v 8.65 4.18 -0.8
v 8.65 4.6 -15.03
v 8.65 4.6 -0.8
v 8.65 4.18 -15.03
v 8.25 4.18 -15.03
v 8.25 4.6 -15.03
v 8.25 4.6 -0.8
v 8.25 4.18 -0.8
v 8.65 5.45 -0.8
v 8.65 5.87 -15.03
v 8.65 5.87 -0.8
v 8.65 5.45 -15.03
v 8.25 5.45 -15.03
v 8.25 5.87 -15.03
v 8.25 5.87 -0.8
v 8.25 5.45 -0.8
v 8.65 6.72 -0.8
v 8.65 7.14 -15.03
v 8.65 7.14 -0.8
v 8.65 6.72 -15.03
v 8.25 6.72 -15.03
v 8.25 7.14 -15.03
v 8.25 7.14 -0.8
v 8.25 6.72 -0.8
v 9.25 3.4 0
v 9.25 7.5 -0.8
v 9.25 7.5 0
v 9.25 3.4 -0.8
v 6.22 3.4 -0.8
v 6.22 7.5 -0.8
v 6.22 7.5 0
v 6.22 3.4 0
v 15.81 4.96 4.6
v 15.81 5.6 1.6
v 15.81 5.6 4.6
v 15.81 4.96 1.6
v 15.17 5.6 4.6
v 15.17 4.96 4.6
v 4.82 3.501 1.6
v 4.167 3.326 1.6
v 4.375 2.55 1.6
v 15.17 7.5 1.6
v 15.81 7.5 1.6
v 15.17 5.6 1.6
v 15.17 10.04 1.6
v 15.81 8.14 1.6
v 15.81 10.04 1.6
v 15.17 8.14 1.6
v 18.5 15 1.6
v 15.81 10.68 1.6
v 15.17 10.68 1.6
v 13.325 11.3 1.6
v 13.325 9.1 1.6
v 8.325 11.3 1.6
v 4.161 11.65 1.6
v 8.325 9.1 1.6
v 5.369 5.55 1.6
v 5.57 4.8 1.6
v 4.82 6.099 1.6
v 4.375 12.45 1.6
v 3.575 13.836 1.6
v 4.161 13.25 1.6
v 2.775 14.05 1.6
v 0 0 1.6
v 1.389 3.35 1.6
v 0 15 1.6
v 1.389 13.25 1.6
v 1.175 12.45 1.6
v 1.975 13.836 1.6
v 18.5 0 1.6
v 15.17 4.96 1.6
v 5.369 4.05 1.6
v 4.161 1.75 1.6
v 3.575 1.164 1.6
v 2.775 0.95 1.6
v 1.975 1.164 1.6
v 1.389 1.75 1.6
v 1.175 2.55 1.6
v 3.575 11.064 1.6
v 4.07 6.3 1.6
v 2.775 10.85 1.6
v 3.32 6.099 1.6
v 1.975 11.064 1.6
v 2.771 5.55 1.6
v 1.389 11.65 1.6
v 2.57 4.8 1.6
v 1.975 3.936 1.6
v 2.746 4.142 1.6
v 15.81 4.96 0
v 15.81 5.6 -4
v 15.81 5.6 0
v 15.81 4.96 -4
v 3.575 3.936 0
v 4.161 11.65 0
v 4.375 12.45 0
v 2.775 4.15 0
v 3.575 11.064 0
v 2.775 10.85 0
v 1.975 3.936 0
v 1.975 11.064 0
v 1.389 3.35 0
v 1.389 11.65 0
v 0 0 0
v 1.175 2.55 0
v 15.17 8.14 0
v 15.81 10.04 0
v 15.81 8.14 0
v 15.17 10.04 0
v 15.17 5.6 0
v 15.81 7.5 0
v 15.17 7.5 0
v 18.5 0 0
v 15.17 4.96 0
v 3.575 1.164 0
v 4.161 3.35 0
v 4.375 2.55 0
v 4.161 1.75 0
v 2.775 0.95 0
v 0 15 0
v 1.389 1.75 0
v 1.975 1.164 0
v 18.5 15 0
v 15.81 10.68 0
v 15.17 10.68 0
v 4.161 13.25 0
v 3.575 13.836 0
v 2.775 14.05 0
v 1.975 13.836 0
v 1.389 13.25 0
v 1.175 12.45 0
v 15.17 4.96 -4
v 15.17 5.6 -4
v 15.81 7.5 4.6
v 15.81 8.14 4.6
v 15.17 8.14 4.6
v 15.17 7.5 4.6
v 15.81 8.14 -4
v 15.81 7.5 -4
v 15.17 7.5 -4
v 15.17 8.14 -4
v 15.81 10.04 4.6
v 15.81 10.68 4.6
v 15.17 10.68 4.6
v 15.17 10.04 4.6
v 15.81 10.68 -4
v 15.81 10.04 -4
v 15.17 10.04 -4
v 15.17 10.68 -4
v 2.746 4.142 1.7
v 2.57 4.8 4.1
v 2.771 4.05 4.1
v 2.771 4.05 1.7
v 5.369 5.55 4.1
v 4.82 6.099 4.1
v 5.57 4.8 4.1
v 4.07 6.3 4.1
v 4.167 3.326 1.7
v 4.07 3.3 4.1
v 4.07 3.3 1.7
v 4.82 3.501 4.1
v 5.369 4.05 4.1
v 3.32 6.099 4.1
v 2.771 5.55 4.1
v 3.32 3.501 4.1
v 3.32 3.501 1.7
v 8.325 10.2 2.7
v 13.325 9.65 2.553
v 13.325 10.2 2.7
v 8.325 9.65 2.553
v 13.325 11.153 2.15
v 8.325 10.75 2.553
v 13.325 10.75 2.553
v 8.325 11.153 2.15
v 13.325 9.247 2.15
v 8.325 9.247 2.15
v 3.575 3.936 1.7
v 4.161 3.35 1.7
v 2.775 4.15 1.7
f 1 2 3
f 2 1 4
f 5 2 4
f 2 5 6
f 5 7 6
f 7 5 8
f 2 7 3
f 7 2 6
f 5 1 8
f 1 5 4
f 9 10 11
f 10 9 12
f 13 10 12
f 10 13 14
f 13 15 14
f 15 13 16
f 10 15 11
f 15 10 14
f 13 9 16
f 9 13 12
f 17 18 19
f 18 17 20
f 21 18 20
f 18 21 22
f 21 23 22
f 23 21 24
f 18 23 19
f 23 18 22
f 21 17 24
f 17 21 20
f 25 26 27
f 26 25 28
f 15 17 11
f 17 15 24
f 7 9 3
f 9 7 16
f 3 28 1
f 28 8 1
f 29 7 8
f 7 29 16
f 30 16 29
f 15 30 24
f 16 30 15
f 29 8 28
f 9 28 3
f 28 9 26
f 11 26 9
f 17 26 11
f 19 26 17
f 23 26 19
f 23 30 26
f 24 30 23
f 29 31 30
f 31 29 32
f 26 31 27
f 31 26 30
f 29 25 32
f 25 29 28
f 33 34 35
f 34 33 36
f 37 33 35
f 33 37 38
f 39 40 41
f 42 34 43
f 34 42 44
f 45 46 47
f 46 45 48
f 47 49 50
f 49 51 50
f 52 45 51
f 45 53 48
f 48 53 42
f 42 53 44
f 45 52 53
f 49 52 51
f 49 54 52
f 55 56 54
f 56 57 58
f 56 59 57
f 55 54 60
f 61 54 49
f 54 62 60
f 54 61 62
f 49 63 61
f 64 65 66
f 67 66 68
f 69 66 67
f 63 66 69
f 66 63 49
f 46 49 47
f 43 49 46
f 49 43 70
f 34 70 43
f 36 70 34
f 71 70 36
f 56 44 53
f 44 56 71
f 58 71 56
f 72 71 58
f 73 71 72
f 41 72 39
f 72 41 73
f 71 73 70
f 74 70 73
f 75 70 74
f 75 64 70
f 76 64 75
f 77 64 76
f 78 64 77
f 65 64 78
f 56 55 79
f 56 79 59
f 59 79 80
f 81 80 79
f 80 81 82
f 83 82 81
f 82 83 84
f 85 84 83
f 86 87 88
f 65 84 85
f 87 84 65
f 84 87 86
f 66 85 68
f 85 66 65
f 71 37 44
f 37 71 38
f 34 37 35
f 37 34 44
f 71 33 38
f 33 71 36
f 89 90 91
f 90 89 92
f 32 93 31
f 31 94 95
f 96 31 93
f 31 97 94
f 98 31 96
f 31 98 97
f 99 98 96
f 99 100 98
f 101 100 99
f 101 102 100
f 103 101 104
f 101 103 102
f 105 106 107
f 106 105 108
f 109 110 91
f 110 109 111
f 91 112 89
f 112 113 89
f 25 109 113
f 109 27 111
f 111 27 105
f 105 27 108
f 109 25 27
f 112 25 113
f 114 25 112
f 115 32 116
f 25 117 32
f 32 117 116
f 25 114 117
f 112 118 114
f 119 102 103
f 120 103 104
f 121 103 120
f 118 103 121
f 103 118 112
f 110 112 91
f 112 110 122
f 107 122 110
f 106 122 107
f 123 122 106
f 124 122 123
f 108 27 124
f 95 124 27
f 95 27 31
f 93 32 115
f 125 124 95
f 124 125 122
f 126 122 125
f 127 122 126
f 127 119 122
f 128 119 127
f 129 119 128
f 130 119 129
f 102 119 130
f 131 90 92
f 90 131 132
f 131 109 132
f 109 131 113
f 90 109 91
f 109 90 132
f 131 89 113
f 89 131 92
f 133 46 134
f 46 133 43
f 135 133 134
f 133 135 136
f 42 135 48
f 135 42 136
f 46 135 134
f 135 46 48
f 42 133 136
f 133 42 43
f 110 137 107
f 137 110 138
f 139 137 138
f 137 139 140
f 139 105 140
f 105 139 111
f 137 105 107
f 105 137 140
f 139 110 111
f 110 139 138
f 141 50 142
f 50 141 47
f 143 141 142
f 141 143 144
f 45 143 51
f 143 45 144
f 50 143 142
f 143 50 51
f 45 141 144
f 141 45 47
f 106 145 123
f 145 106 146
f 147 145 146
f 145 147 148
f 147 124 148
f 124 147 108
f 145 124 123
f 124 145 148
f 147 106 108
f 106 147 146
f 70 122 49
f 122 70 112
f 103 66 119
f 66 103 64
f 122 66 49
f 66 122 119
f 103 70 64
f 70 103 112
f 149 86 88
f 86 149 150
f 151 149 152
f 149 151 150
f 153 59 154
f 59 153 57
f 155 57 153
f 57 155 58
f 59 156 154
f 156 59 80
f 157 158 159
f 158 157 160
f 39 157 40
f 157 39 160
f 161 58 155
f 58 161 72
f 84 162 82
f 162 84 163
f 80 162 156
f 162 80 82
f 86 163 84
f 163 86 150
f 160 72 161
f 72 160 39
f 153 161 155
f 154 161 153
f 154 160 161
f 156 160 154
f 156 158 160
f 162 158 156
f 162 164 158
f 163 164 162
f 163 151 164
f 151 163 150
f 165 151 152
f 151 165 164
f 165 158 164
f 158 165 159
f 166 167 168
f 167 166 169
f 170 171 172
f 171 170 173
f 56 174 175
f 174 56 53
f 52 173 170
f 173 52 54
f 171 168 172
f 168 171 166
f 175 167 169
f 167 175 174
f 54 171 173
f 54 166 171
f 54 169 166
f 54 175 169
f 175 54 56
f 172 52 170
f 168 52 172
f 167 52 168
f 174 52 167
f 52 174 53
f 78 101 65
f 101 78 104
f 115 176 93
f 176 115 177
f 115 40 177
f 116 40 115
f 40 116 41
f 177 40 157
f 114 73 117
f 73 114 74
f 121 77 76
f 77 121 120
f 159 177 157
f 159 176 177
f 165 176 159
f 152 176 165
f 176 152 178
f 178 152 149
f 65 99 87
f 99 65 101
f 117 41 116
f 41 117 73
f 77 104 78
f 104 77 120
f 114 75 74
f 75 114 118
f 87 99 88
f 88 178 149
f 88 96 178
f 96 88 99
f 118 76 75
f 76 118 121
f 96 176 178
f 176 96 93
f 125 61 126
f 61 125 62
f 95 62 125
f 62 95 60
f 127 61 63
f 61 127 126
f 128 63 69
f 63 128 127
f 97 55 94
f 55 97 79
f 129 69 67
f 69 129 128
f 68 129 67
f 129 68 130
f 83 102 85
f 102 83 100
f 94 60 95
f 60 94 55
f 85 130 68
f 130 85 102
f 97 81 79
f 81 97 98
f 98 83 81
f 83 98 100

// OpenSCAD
// KY-003 Hall Magnetic Sensor Module — dock water-level / canister-present sensor
// BOM (upstream BOM.md, Dock table): "Water level, canisters present sensors | 4 |
// $0.30 | Hall sensors KY-003, 2x (clean + dirty water) canister present + 2x
// (clean-low, dirty-full) floats"
//
// Function: 3-pin digital Hall-effect switch module (A3144 unipolar switch +
// pull-up resistor + status LED) that outputs ACTIVE-LOW when the SOUTH pole of
// a magnet is presented to the MARKED face of the A3144. In OOMWOO the dock
// mounts four of these to detect magnet-fitted floats (clean-low, dirty-full)
// and magnet-fitted canisters (clean/dirty present). "KY-003" is a generic
// clone-name shared by many vendors (Elegoo/Keyes 37-in-1 kits, JOY-IT, etc.)
// whose PCB outline DIFFERS by vendor — see `variant` below.
//
// Dimension provenance (ALL fetched THIS run, 2026-08-17):
//  * A3144 IC body  — (datasheet: Allegro A3141-2-3-4 Datasheet, Discontinued
//    Product Data Sheet 27621.6B, Dwg. MH-014E, "PACKAGE DESIGNATOR 'UA'":
//    body W 4.04-4.17, L 2.97-3.10, H 1.47-1.57 mm; lead pitch 1.27 BSC; lead
//    width 0.36-0.48; lead thickness 0.35-0.44; overall len w/ formed leads
//    15.24-16.26 mm). "suffix '-UA' is a three-lead ultra-mini-SIP".
//  * JOY-IT variant envelope — (datasheet: JOY-IT SEN-KY003HMS Datasheet
//    2023-08-25: "Dimensions 30 x 15 x 7 mm", chipset A3144, active-low,
//    supply 4.5-24 V).
//  * Generic 37-in-1/enclosure form factor — (secondary: arduinomodules.info
//    KY-003 page, fetched 2026-08-17: "Board dimensions: 18.5 x 15 mm",
//    3x 2.54 mm header pins, pinning "-/VCC/S" w/ S right, middle VCC).
//  * STANDARD-variant PCB thickness 1.6 mm — (estimate) standard FR4; caliper.
//  * All internal component POSITIONS on both variants — (estimate), clones
//    differ; see MEASURE-ME §19. The critical dock facts to re-verify on the
//    physical unit are the PCB envelope + where the A3144 marked face sits.
//
// Licensed CC0 — use freely.

// ===== PARAMETERS =====

// ---- Variant selector: "standard" (AliExpress/37-in-1 generic) or "joyit" ----
variant   = "standard"; // "standard" | "joyit"

// ---- PCB envelope ----
// standard variant (secondary: arduinomodules.info 18.5 x 15; thickness est)
// joyit    variant (datasheet: JOY-IT SEN-KY003HMS "30 x 15 x 7 mm")
pcb_l     = (variant == "joyit") ? 30.0 : 18.5; // mm board LENGTH along pin axis
pcb_w     = (variant == "joyit") ? 15.0 : 15.0; // mm board WIDTH  across pin axis
pcb_t     = (variant == "joyit") ? 1.6  : 1.6;  // mm board thickness (estimate) FR4
// (joyit's 7 mm overall height is BOARD+COMPONENTS; see comp_h below)

// ---- A3144 unipolar Hall-effect switch, package -UA (datasheet: Allegro
// ---- D.S. 27621.6B, Dwg. MH-014E — all from the UA package drawing)
ic_w      =  4.10;  // mm (datasheet: UA body width 4.04-4.17) nominal
ic_l      =  3.03;  // mm (datasheet: UA body length 2.97-3.10) nominal
ic_h      =  1.52;  // mm (datasheet: UA body height 1.47-1.57) nominal
ic_lead_p =  1.27;  // mm (datasheet: UA lead pitch "0.050 BSC")
ic_lead_w =  0.42;  // mm (datasheet: lead width 0.36-0.48) nominal
ic_lead_t =  0.40;  // mm (datasheet: lead thickness 0.35-0.44) nominal
ic_len    = 15.75;  // mm (datasheet: overall length w/ formed leads 15.24-16.26) nom
// Sensing axis: unipolar switch; south pole to the MARKED face triggers low.
// The module mounts the IC FLAT on the PCB, marked face pointing +Z up/away
// from the board (layout (estimate)) — magnet must approach from component side.

// ---- Header pins (3x 2.54) ---- (electrical/mechanical standard, (estimate) layout)
pin_pitch = 2.54;   // mm (standard) 2.54mm male header
pin_side  = 0.64;   // mm (standard) square 0.64 header pin
pin_h_abv = 3.0;    // mm (estimate) exposed pin length above board
pin_h_blw = 4.0;    // mm (estimate) pin tip length below board (component side)
pin_x     = pcb_l * 0.82; // mm (estimate) pin row along L-axis from -L edge
pin_center_y = pcb_w / 2; // mm (estimate) pin row centered on width

// ---- On-board components (positions (estimate)) ----
led_x    = pcb_l * 0.22;  // mm (estimate) status LED pos along L (near pin end)
led_y    = pcb_w * 0.32;  // mm (estimate) LED pos across width
led_d    = 3.0;           // mm (estimate) Ø3 LED body
led_h    = 2.5;           // mm (estimate) exposed LED height above board
res_x    = pcb_l * 0.45;  // mm (estimate) 680R resistor pos along L
res_y    = pcb_w * 0.68;  // mm (estimate) resistor pos across width
res_d    = 2.2;           // mm (estimate) resistor body Ø (axial 680R)
res_l    = 5.0;           // mm (estimate) resistor body length
comp_h   = 3.5;           // mm (estimate) maximum component height above PCB
                          //   (pins 3.0 < comp_h; LED 2.5 < comp_h). For the
                          //   joyit variant the datasheet overall height is
                          //   7 mm = pcb_t + taller-of-header/nothing special;
                          //   keep comp_h as the clearance budget, caliper it.

// ---- Mounting holes (verify on physical unit! layout (estimate)) ----
mtg = true;              // toggle the (estimate) M3 hole pair
mtg_dia   = 3.2;         // mm (estimate) M3 clearance drill
mtg_y     = pcb_w * 0.5; // mm (estimate) holes across width centerline
mtg_pitch = pcb_w * 0.66;// mm (estimate) hole pair spacing
mtg_x     = pcb_l * 0.15; // mm (estimate) hole pair along L-axis, on the
                          //   short edge OPPOSITE the header pins (typical
                          //   layout on 37-in-1 boards); caliper the real one.

$fn = 16;

// ===== MODULES =====

module pcb() {
    color("DarkGreen", 0.85) cube([pcb_l, pcb_w, pcb_t]);
}

module a3144_ua() {
    // A3144 in ultra-mini-SIP ('UA') package, mounted FLAT, marked face +Z.
    // Leads exit -Z through the PCB plane. Body/envelope per D.S. 27621.6B.
    color("Black") {
        translate([-ic_l/2, -ic_w/2, -pcb_t/2])
            cube([ic_l, ic_w, ic_h]); // body
        // 3 formed leads, 1.27 pitch, running down below the body plane
        for (i = [0 : 2]) {
            translate([ic_l/2 - 1.0, (i - 1) * ic_lead_p, -pcb_t/2 - ic_len + ic_h])
                cube([ic_lead_t, ic_lead_w, ic_len + pcb_t/2]);
        }
    }
    // Marked face indicator — small tab pointing +Z (this face senses S-pole)
    color("Silver")
        translate([-ic_l/2 + 0.4, -ic_w/2, pcb_t/2 - 0.2])
            cube([0.8, ic_w - 1.2, 0.25]);
}

module header_pins() {
    // 3x 2.54 male header on one short edge, "- / VCC / S" order (S on +y side)
    color("Gold") {
        for (i = [0 : 2]) {
            translate([pin_x, pin_center_y + (i - 1) * pin_pitch, pcb_t])
                cube([pin_side, pin_side, pin_h_abv]);
            translate([pin_x, pin_center_y + (i - 1) * pin_pitch, -pin_h_blw])
                cube([pin_side, pin_side, pin_h_blw]);
        }
    }
}

module status_led() {
    color("Red", 0.8) {
        translate([led_x, led_y, pcb_t])
            cylinder(d = led_d, h = led_h, $fn = 12);
    }
}

module resistor() {
    color("Brown", 0.8) {
        translate([res_x, res_y, pcb_t])
            rotate([0, 90, 0])
                cylinder(d = res_d, h = res_l, $fn = 12);
    }
}

module mounting_holes() {
    if (mtg) {
        for (sx = [-1, 1]) {
            translate([mtg_x, mtg_y + sx * mtg_pitch/2, -0.1])
                cylinder(h = pcb_t + 0.2, d = mtg_dia, $fn = 12);
        }
    }
}

module assembly() {
    difference() {
        union() {
            pcb();
            // IC centered on board, sits on+through the PCB plane — position (estimate)
            translate([pcb_l/2 - ic_l/2, pcb_w/2 - ic_w/2, 0])
                a3144_ua();
            header_pins();
            status_led();
            resistor();
        }
        mounting_holes();
    }
}

// ===== RENDER =====
assembly();

// ===== NOTES =====
// (1) "KY-003" is a clone-name. THE envelope is vendor-specific: JOY-IT's
//     SEN-KY003HMS is 30 x 15 x 7 mm (datasheet) whereas the widespread
//     AliExpress/37-in-1 board is ~18.5 x 15 x 1.6 mm (18.5x15 secondary;
//     1.6 est). This model renders BOTH via `variant` so a dock pocket draft
//     can be checked against whichever unit is actually sourced. The instant
//     the maintainer's unit lands, caliper it and set the REAL envelope —
//     every whitelabel re-layout changes hole/pin/sensor positions.
//
// (2) Electrical identity is NOT vendor-variant: A3144 unipolar switch,
//     supply 4.5-24 V (datasheet absolute/op range), open-collector active-low
//     output, operate point A3144x = 35-450 G (D.S. 27621.6B selection table),
//     reverse-battery-protected, Schmitt-trigger hysteresis. pinning on the
//     module (generic layout): one end pin = signal (S), middle = VCC,
//     remaining = GND (-). South pole → marked face → output LOW.
//
// (3) The dust/float-critical value is the sensing-axis standoff, NOT the PCB
//     mm. The float magnet must (a) present its SOUTH pole to the IC's marked
//     face and (b) stay inside the trigger distance for the RELEASE level of
//     the float magnet used (unipolar: trigger=35-450 G bop/release 25-430 G
//     brp per datasheet; with a small float magnet the usable gap is usually
//     ~0-10 mm — measure with Jig 18 cubes + your magnet, don't trust this).
//     Adjust the cast standoff in the dock housing, not the magnet.
//
// (4) Mounting holes here are a PROPOSED pair (M3, Ø3.2) at (estimate)
//     positions. Clones often ship with no clean M3 pattern. If the sourced
//     board has no usable holes, the dock cavity must retain the board by
//     envelope walls / adhesive instead of screws — Jig 17 only verifies the
//     envelope/slide fit; production retention is a dock-cavity design choice.
